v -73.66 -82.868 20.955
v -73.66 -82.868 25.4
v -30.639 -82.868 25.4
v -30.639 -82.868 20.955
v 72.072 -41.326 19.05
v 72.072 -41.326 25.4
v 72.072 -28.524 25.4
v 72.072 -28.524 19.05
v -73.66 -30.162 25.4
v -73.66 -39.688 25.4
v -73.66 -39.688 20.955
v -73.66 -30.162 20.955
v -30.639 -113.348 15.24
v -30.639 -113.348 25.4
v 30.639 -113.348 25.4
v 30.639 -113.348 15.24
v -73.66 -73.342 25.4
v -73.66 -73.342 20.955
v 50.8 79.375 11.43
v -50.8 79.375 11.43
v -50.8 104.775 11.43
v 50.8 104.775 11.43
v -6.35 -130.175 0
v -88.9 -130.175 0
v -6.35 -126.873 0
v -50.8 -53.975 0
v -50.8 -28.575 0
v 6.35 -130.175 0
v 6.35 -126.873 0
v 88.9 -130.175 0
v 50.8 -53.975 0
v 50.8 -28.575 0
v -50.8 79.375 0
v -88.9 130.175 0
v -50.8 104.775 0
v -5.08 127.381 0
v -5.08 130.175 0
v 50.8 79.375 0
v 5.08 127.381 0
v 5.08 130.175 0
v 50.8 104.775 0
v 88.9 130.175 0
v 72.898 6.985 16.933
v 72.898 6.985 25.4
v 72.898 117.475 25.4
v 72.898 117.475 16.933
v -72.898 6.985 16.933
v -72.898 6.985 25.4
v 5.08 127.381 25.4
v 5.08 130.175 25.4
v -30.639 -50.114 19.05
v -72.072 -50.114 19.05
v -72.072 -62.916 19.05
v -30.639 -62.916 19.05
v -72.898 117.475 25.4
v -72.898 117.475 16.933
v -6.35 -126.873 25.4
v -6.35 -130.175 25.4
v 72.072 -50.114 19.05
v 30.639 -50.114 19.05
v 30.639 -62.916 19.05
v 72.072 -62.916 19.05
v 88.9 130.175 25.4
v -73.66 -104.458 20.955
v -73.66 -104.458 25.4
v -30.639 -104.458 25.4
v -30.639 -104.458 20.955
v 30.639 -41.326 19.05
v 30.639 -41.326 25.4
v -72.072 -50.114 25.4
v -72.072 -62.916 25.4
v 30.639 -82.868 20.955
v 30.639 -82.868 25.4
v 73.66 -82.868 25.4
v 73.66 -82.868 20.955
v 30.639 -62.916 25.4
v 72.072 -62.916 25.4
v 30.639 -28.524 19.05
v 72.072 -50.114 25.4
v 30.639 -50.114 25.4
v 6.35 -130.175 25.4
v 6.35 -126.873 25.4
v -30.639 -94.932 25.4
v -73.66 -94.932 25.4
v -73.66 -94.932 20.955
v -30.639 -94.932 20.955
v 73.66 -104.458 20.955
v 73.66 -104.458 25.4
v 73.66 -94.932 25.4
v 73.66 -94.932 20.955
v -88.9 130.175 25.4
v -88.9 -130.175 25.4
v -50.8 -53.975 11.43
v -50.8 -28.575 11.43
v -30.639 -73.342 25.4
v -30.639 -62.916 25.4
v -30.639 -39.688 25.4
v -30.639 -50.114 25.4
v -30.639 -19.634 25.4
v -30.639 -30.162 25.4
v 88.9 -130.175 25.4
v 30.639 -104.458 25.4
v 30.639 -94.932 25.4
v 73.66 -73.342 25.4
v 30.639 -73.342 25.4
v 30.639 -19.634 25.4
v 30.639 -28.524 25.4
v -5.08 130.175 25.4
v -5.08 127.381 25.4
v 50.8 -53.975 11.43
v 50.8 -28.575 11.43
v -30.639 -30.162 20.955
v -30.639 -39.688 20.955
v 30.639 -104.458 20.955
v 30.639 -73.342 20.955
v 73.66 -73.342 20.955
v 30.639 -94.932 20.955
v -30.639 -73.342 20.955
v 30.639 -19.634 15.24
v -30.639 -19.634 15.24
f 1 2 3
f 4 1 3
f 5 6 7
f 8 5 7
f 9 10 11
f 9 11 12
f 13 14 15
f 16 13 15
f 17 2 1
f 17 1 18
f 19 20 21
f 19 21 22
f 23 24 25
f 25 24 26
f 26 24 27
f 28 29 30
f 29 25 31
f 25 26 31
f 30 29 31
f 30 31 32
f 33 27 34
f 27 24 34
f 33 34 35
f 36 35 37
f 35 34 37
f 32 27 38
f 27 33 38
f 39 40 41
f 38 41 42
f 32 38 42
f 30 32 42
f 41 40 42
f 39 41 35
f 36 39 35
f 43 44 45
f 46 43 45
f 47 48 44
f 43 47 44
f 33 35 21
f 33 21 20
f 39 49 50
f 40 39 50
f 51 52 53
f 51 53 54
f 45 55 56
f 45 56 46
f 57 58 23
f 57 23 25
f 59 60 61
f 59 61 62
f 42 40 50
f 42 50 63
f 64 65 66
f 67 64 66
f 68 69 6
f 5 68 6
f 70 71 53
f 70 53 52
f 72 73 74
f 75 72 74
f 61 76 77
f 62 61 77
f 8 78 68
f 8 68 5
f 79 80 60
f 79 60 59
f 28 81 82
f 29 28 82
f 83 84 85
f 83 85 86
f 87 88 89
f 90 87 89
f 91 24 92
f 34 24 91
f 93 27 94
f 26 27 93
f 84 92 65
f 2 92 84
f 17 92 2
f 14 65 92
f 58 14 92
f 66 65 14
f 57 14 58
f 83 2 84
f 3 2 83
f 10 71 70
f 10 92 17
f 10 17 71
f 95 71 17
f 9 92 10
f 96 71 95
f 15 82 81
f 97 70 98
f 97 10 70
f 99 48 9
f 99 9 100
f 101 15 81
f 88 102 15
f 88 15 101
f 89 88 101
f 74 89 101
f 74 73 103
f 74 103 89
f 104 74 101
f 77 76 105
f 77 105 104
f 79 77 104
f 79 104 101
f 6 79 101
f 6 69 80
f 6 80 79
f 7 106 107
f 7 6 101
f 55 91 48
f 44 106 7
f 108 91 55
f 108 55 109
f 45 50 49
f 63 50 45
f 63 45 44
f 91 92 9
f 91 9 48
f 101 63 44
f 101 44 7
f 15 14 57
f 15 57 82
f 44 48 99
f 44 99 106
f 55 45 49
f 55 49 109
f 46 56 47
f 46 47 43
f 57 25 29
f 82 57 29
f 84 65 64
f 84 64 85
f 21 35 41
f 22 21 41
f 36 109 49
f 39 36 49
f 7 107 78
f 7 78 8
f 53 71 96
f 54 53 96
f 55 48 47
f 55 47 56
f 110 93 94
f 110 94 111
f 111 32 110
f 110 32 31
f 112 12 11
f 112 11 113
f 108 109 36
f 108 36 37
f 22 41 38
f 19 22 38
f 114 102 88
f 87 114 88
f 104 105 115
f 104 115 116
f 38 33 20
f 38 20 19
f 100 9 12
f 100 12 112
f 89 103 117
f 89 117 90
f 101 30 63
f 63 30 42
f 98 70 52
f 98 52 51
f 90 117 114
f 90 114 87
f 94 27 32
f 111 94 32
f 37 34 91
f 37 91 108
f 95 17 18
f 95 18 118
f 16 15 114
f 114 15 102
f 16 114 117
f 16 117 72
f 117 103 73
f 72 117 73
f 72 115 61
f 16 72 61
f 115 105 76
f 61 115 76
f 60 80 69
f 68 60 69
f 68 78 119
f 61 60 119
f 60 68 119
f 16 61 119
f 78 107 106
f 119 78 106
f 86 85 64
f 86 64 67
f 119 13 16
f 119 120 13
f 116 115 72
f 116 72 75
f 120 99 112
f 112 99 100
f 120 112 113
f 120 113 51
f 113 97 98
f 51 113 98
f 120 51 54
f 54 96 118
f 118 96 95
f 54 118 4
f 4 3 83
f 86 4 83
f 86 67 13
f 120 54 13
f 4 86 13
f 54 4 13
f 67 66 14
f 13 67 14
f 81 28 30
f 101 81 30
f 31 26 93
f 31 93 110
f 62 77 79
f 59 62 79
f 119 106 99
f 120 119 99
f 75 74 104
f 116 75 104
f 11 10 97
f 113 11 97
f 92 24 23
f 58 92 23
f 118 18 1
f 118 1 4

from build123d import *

# Parameters (mm, degrees)
F0_W      = 177.8
F0_H      = 260.35
F1_DEPTH  = 25.4
F2_W      = 10.16
F2_H      = 5.588
F2_W_2    = 12.7
F2_H_2    = 6.604
F3_DEPTH  = 25.401
F4_W      = 145.796
F4_H      = 110.49
F5_DEPTH  = 8.466667
F6_W      = 41.43375
F6_H      = 12.8016
F7_DEPTH  = 6.35
F6_W_2    = 43.02125
F6_H_2    = 9.525
F8_DEPTH  = 4.445
F6_W_3    = 15.39875
F6_W_4    = 13.81125
F9_DEPTH  = 10.16
F10_W     = 101.6
F10_H     = 25.4
F11_DEPTH = 11.43


with BuildPart() as f1:
    # F0 (on Top) → F1 (new body)
    with BuildSketch(Plane.XY):
        Rectangle(F0_W, F0_H)
    extrude(amount=F1_DEPTH)

    # F2 (on face) → F3 (cut, through all)
    with BuildSketch(Plane.XY.offset(25.4)):
        with Locations((0, 130.175)):
            Rectangle(F2_W, F2_H)
        with Locations((0, -130.175)):
            Rectangle(F2_W_2, F2_H_2)
    extrude(amount=-F3_DEPTH, mode=Mode.SUBTRACT)

    # F4 (on face) → F5 (cut)
    with BuildSketch(Plane.XY.offset(25.4)):
        with Locations((0, 62.23)):
            Rectangle(F4_W, F4_H)
    extrude(amount=-F5_DEPTH, mode=Mode.SUBTRACT)

    # F6 (on face) → F7 (cut)
    with BuildSketch(Plane.XY.offset(25.4)):
        with Locations((-51.355625, -56.515)):
            Rectangle(F6_W, F6_H)
        with Locations((51.355625, -56.515)):
            Rectangle(F6_W, F6_H)
        with Locations((51.355625, -34.925)):
            Rectangle(F6_W, F6_H)
    extrude(amount=-F7_DEPTH, mode=Mode.SUBTRACT)

    # F6 (on face) → F8 (cut)
    with BuildSketch(Plane.XY.offset(25.4)):
        with Locations((-52.149375, -34.925)):
            Rectangle(F6_W_2, F6_H_2)
        with Locations((-52.149375, -78.105)):
            Rectangle(F6_W_2, F6_H_2)
        with Locations((-52.149375, -99.695)):
            Rectangle(F6_W_2, F6_H_2)
        with Locations((52.149375, -78.105)):
            Rectangle(F6_W_2, F6_H_2)
        with Locations((52.149375, -99.695)):
            Rectangle(F6_W_2, F6_H_2)
    extrude(amount=-F8_DEPTH, mode=Mode.SUBTRACT)

    # F6 (on face) → F9 (cut)
    with BuildSketch(Plane.XY.offset(25.4)):
        Polygon((-15.24, -30.1625), (-15.24, -39.6875), (-30.63875, -39.6875), (-30.63875, -50.1142), (-16.8275, -50.1142), (-16.8275, -62.9158), (-30.63875, -62.9158), (-30.63875, -73.3425), (-15.24, -73.3425), (-15.24, -82.8675), (-30.63875, -82.8675), (-30.63875, -94.9325), (-15.24, -94.9325), (-15.24, -104.4575), (-30.63875, -104.4575), (-30.63875, -113.3475), (30.63875, -113.3475), (30.63875, -104.4575), (15.24, -104.4575), (15.24, -94.9325), (30.63875, -94.9325), (30.63875, -82.8675), (15.24, -82.8675), (15.24, -73.3425), (30.63875, -73.3425), (30.63875, -62.9158), (16.8275, -62.9158), (16.8275, -50.1142), (30.63875, -50.1142), (30.63875, -41.3258), (16.8275, -41.3258), (16.8275, -28.5242), (30.63875, -28.5242), (30.63875, -19.6342), (-30.63875, -19.6342), (-30.63875, -30.1625), align=None)
        with Locations((-22.939375, -34.925)):
            Rectangle(F6_W_3, F6_H_2)
        with Locations((-23.733125, -56.515)):
            Rectangle(F6_W_4, F6_H)
        with Locations((-22.939375, -78.105)):
            Rectangle(F6_W_3, F6_H_2)
        with Locations((-22.939375, -99.695)):
            Rectangle(F6_W_3, F6_H_2)
        with Locations((22.939375, -99.695)):
            Rectangle(F6_W_3, F6_H_2)
        with Locations((22.939375, -78.105)):
            Rectangle(F6_W_3, F6_H_2)
        with Locations((23.733125, -56.515)):
            Rectangle(F6_W_4, F6_H)
        with Locations((23.733125, -34.925)):
            Rectangle(F6_W_4, F6_H)
    extrude(amount=-F9_DEPTH, mode=Mode.SUBTRACT)

    # F10 (on face) → F11 (cut)
    with BuildSketch(Plane(origin=(0, 0, 0), x_dir=(1, 0, 0), z_dir=(0, 0, -1))):
        with Locations((0, 41.275)):
            Rectangle(F10_W, F10_H)
        with Locations((0, -92.075)):
            Rectangle(F10_W, F10_H)
    extrude(amount=-F11_DEPTH, mode=Mode.SUBTRACT)


solid = f1.part
